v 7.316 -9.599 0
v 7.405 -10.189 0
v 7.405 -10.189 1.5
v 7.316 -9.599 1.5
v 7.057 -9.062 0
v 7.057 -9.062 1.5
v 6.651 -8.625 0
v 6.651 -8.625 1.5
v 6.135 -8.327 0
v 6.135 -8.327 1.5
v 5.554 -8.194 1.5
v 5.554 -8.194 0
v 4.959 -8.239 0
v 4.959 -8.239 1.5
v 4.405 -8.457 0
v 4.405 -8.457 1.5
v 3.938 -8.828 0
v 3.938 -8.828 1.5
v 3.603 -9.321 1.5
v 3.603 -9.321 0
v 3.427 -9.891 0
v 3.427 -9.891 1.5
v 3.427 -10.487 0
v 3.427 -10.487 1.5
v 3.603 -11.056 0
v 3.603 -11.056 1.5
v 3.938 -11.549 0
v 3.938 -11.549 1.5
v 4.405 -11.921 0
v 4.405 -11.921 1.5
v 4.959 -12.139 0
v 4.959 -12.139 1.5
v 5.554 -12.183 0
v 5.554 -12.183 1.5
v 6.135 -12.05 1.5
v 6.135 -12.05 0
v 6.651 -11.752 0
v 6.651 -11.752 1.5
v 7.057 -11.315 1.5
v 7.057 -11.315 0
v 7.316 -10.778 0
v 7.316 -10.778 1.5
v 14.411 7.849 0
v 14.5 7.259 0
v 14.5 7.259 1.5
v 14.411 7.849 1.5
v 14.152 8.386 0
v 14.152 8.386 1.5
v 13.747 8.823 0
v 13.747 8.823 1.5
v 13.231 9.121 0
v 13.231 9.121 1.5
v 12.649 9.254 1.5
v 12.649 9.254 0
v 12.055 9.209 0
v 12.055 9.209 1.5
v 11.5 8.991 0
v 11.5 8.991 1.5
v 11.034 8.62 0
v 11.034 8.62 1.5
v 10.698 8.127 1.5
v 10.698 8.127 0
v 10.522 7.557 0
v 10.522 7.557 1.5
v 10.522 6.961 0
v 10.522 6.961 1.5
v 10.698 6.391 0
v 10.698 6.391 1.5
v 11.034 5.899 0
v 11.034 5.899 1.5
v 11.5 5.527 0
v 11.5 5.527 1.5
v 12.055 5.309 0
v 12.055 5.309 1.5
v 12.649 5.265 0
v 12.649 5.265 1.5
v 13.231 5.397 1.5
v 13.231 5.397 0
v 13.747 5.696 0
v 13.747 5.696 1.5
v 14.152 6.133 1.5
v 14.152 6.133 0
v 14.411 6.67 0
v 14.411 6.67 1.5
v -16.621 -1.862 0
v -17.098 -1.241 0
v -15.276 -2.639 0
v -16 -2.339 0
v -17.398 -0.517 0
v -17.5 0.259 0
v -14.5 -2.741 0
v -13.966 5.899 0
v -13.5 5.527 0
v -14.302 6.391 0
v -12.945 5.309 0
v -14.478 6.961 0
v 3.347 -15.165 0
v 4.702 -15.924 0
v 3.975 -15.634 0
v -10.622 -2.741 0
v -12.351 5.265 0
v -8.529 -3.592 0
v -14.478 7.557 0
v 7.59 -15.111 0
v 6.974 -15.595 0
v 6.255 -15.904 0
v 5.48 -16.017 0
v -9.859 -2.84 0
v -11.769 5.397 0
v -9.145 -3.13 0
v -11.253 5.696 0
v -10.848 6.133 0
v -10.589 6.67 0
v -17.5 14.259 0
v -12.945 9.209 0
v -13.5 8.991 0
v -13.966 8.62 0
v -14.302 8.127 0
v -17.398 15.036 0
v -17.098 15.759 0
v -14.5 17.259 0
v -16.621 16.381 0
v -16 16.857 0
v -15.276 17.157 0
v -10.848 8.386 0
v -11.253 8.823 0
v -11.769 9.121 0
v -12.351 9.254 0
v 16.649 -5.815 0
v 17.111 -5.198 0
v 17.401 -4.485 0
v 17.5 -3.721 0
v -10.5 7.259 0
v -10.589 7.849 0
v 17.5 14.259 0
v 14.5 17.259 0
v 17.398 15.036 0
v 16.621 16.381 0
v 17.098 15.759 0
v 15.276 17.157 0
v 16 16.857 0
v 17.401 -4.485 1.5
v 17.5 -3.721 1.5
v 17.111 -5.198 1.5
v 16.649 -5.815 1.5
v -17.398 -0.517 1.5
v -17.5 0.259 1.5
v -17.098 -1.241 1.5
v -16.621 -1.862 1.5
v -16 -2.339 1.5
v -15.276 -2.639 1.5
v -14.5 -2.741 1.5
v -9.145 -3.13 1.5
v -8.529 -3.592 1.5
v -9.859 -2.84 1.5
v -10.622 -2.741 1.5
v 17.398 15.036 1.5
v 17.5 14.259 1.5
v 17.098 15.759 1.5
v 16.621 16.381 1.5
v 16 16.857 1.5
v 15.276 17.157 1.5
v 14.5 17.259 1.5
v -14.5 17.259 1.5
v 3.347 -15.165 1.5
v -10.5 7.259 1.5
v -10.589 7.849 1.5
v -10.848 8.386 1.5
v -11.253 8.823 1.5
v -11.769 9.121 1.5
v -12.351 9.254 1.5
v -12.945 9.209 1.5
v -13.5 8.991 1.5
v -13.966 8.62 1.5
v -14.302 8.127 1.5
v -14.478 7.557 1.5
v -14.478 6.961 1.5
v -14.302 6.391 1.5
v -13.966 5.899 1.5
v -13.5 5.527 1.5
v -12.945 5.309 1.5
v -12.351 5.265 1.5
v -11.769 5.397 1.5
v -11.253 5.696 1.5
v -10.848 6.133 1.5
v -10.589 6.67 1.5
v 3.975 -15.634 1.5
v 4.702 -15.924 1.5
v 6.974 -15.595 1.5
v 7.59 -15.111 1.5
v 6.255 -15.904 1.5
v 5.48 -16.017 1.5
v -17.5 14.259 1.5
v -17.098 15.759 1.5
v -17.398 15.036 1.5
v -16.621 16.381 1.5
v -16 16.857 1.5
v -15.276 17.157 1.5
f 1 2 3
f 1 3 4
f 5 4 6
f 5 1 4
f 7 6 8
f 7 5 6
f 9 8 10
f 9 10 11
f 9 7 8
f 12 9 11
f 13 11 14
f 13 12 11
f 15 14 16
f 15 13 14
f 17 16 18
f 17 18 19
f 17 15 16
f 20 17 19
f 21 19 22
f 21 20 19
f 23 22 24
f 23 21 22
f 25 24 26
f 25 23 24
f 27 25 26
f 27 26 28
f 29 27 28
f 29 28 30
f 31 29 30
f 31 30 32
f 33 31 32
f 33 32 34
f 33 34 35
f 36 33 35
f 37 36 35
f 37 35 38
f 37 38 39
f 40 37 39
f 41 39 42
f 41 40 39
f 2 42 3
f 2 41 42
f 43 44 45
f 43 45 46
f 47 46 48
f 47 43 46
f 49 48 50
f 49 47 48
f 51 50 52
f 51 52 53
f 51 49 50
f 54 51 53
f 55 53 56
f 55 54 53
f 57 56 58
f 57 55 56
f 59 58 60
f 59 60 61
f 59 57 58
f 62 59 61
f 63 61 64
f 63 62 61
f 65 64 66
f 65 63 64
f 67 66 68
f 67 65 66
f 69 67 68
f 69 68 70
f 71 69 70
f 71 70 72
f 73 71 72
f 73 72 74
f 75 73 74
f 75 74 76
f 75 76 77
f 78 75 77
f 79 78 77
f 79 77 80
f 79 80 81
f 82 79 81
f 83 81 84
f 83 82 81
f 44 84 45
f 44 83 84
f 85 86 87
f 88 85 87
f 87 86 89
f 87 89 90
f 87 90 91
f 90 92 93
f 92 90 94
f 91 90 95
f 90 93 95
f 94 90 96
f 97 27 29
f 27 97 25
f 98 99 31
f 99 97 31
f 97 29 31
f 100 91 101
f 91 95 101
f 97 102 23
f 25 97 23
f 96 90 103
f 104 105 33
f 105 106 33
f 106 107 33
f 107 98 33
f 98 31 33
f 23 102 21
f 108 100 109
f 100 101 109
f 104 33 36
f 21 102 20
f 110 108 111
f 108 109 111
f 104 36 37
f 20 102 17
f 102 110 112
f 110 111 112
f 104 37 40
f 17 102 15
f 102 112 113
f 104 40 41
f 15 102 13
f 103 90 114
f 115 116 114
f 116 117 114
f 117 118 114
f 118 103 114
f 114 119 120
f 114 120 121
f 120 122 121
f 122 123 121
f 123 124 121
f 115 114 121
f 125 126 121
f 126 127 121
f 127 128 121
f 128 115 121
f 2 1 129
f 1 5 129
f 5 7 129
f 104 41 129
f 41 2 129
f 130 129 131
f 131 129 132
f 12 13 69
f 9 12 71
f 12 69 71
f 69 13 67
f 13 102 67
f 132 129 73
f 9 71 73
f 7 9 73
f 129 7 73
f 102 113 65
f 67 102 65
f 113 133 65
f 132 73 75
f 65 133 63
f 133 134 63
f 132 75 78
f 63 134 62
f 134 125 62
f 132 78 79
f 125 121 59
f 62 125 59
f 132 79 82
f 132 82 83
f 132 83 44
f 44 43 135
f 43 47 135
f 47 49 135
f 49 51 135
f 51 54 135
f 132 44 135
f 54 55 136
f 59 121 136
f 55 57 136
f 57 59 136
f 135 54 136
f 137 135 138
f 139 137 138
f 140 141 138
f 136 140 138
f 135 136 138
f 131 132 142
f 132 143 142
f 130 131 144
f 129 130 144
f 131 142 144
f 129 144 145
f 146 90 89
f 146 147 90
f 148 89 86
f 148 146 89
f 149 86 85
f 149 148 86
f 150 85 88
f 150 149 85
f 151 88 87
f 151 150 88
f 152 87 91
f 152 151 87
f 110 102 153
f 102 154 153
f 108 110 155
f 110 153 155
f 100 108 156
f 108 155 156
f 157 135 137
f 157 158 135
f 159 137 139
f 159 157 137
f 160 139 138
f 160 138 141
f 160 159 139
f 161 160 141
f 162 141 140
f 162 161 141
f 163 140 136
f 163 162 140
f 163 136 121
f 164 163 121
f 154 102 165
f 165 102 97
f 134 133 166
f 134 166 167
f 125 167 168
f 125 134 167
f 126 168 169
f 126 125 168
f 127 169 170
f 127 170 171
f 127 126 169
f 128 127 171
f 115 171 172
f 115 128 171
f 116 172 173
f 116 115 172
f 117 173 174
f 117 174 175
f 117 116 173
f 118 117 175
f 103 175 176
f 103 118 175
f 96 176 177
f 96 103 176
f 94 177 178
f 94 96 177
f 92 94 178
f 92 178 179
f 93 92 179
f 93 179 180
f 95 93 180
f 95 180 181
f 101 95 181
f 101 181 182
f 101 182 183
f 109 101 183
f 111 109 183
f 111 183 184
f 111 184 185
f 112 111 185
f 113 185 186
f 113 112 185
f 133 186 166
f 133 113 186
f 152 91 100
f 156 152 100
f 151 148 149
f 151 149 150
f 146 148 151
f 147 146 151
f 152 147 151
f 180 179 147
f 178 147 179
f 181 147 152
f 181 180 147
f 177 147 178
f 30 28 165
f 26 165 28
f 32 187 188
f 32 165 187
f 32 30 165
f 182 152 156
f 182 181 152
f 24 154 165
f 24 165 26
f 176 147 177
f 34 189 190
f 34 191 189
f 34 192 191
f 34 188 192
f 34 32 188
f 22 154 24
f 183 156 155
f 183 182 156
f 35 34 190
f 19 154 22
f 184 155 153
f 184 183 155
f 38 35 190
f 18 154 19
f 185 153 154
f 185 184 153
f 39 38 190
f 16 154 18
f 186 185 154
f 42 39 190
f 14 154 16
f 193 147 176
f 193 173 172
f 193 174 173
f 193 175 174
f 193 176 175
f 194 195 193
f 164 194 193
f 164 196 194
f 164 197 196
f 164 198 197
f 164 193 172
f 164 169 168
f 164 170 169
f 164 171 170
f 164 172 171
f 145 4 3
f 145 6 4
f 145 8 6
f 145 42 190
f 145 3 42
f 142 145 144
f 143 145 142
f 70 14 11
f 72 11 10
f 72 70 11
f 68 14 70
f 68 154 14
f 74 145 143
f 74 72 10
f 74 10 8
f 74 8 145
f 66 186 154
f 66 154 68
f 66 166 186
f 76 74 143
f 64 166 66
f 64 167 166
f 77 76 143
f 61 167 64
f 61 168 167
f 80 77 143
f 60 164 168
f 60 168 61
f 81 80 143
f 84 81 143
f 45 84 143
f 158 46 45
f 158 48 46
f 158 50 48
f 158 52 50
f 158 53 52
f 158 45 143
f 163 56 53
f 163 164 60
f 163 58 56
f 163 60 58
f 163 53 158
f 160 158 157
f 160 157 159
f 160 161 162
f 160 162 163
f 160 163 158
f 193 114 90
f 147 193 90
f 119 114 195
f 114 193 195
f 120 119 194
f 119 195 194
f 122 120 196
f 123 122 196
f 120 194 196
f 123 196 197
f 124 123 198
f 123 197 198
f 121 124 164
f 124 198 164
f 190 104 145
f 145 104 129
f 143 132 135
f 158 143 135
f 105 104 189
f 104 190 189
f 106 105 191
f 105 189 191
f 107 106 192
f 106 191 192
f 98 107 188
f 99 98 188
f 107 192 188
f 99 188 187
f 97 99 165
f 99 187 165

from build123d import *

# Parameters (mm, degrees)
SKETCH_1_R      = 2
EXTRUDE_1_DEPTH = 1.5
FILLET_1_R      = 3


with BuildPart() as part:
    # ｽｹｯﾁ1 → ﾎﾞｽ - 押し出し1 (new body)
    # profile 1 of 2: a face of its own
    with BuildSketch(Plane.XY):
        Polygon((-9.402488121, -2.740817625), (5.495827016, -17.259182375), (17.5, -4.940856231), (17.5, 17.259182375), (-17.5, 17.259182375), (-17.5, 5.150184139), align=None)
        with Locations((5.404503628, -10.188704312)):
            Circle(SKETCH_1_R, mode=Mode.SUBTRACT)
        with Locations((-12.5, 7.259182375)):
            Circle(SKETCH_1_R, mode=Mode.SUBTRACT)
        with Locations((12.5, 7.259182375)):
            Circle(SKETCH_1_R, mode=Mode.SUBTRACT)
    # profile 2 of 2: a face of its own
    with BuildSketch(Plane.XY):
        Polygon((-17.5, 5.150184139), (-17.5, -2.740817625), (-9.402488121, -2.740817625), align=None)
    extrude(amount=EXTRUDE_1_DEPTH)

    # ﾌｨﾚｯﾄ1
    fillet_1_edges = [part.edges().sort_by_distance(p)[0] for p in [
        (-9.402488121, -2.740817625, 0.75),
        (-17.5, -2.740817625, 0.75),
        (-17.5, 17.259182375, 0.75),
        (17.5, 17.259182375, 0.75),
        (17.5, -4.940856231, 0.75),
        (5.495827016, -17.259182375, 0.75),
    ]]
    fillet(fillet_1_edges, radius=FILLET_1_R)


solid = part.part
